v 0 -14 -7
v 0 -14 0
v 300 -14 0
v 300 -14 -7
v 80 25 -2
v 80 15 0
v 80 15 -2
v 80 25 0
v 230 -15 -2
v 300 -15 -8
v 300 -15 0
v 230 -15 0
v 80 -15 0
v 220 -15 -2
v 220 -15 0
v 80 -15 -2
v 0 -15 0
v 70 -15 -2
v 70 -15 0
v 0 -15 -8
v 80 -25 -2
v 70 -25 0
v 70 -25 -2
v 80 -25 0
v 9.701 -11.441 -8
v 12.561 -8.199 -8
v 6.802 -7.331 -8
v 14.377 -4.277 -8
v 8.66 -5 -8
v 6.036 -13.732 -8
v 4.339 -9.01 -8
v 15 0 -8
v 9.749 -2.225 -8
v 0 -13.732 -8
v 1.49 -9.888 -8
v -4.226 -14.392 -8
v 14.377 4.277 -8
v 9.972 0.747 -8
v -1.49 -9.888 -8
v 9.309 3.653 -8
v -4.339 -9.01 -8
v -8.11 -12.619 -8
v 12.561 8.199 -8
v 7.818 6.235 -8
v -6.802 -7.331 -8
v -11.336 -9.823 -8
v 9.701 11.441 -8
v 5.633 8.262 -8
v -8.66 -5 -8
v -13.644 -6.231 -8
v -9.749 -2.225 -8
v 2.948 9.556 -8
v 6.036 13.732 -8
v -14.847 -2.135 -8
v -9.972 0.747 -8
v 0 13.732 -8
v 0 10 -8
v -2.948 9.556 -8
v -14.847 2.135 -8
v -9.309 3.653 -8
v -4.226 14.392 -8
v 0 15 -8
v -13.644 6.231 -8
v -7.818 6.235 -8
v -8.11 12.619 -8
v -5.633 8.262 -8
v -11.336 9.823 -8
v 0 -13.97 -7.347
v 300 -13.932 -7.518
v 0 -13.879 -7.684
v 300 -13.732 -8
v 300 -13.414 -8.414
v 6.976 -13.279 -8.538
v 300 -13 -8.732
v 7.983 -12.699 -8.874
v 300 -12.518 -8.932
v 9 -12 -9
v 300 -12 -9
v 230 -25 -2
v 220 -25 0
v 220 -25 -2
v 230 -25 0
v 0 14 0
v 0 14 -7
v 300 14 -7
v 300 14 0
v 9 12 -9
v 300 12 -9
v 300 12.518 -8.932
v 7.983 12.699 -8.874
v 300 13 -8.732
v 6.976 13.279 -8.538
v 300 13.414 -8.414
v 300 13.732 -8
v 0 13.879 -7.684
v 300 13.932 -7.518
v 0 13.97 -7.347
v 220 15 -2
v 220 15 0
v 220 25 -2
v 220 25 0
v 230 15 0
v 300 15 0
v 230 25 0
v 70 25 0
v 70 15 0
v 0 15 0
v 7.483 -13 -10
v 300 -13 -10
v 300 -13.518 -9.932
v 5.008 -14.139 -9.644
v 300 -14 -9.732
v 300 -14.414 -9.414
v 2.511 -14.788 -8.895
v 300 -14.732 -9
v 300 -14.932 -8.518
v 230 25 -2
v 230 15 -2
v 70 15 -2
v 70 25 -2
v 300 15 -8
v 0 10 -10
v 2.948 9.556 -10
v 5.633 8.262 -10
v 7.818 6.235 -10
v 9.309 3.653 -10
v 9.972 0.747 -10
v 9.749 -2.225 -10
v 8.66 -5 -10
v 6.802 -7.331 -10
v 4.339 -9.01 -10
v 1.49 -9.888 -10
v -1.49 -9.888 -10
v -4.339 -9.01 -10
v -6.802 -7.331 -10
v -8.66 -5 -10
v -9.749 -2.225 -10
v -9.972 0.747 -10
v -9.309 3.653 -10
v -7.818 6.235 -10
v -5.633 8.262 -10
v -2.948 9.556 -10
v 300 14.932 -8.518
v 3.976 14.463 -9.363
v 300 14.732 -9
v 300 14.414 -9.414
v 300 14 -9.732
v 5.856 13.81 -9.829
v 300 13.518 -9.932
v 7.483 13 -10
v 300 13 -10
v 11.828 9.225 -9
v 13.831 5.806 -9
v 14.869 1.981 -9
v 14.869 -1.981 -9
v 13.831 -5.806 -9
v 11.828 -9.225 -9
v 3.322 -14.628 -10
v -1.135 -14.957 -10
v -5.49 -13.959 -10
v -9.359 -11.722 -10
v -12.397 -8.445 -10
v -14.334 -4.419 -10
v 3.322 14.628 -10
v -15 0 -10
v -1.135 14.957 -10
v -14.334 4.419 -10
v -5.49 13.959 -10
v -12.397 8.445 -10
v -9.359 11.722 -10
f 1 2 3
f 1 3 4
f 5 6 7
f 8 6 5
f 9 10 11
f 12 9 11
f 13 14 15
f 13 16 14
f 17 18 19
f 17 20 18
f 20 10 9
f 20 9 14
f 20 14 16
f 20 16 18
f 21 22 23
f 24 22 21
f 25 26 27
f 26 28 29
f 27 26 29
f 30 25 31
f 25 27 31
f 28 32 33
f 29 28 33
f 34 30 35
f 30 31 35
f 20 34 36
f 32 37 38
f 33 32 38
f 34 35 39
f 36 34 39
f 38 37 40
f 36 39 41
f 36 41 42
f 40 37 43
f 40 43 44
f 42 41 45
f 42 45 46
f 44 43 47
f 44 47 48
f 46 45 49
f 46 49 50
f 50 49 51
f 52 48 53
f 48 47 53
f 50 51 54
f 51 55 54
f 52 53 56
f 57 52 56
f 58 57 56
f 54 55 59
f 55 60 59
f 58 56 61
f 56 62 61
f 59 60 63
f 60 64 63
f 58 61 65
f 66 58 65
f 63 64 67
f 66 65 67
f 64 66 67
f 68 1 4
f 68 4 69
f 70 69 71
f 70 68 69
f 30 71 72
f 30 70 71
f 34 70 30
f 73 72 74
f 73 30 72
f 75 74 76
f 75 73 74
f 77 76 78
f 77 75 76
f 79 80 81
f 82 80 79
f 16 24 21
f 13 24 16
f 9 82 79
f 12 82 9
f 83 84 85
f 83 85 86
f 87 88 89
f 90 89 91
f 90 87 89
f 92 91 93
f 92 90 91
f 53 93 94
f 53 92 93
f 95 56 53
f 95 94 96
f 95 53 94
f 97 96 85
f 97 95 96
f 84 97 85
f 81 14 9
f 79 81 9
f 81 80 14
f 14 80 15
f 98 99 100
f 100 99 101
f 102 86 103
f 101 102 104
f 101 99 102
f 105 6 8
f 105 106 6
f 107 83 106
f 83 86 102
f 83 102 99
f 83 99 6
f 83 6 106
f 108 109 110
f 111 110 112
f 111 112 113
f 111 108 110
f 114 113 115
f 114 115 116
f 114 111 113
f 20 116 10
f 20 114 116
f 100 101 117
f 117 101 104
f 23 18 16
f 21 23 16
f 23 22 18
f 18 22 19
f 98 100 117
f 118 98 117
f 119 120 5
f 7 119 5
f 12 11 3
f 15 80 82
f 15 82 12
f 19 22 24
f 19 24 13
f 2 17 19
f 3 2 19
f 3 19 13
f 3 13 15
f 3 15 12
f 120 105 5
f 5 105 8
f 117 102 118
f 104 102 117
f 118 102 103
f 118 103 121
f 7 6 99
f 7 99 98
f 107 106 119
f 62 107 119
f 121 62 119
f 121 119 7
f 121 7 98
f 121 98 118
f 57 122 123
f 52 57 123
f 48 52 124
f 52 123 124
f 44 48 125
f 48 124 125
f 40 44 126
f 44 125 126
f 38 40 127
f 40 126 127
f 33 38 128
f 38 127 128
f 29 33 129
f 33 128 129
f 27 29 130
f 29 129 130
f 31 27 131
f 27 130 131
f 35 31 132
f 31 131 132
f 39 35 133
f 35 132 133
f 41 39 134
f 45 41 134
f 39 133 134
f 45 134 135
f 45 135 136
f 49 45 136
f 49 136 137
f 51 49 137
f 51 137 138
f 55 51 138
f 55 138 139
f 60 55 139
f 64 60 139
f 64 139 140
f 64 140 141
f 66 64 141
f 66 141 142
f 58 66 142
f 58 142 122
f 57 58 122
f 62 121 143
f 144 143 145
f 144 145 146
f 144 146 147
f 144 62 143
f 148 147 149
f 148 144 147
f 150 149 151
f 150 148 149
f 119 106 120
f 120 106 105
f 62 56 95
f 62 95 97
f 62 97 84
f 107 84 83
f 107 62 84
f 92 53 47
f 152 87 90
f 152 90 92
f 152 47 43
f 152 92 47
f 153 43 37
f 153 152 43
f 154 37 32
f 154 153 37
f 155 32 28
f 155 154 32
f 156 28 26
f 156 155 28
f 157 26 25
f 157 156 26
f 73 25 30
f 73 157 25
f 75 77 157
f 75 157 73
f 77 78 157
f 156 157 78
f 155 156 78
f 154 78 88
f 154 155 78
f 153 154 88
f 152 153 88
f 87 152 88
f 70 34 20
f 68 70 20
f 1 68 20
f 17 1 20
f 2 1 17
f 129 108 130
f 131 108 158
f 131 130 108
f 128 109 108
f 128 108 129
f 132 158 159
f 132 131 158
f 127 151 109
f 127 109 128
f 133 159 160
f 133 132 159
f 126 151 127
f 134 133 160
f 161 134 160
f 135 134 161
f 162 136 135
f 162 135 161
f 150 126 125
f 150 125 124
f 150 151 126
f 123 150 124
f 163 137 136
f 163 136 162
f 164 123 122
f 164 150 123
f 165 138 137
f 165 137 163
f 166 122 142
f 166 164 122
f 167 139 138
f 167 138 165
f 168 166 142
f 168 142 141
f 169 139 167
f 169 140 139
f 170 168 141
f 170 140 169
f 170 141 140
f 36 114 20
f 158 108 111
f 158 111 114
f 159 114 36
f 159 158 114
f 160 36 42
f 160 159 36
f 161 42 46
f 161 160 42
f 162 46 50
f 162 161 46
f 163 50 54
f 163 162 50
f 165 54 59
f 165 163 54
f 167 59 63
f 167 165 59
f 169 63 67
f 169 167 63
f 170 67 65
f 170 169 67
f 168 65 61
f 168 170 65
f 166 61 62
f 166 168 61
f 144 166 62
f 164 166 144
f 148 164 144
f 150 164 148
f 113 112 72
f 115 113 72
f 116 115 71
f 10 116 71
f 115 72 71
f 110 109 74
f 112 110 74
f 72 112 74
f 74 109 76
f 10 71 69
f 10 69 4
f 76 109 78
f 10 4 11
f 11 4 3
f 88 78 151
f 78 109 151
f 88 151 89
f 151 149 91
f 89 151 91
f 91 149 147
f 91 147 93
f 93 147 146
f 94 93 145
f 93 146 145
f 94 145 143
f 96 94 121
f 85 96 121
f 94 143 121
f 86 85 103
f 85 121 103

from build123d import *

# Parameters (mm, degrees)
BOSS_EXTRUDE1_DEPTH = 300
SKETCH2_W           = 10
SKETCH2_H           = 10
BOSS_EXTRUDE2_DEPTH = 2
SKETCH4_R           = 15
SKETCH4_R_2         = 10
BOSS_EXTRUDE3_DEPTH = 2
SKETCH4_3_R         = 10
CUT_EXTRUDE1_DEPTH  = 2


with BuildPart() as part:
    # Sketch1 → Boss-Extrude1 (new body)
    with BuildSketch(Plane(origin=(0, 0, 0), x_dir=(0, 0, -1), z_dir=(1, 0, 0))):
        with BuildLine():
            Line((8, 15), (0, 15))
            Line((0, 15), (0, 14))
            Line((0, 14), (7, 14))
            ThreePointArc((7, 14), (8.414213562, 13.414213562), (9, 12))
            Line((9, 12), (9, -12))
            ThreePointArc((9, -12), (8.414213562, -13.414213562), (7, -14))
            Line((7, -14), (0, -14))
            Line((0, -14), (0, -15))
            Line((0, -15), (8, -15))
            ThreePointArc((8, -15), (9.414213562, -14.414213562), (10, -13))
            Line((10, -13), (10, 13))
            ThreePointArc((10, 13), (9.414213562, 14.414213562), (8, 15))
        make_face()
    extrude(amount=BOSS_EXTRUDE1_DEPTH)

    # Sketch2 → Boss-Extrude2 (add)
    with BuildSketch(Plane.XY):
        with Locations((75, 20)):
            Rectangle(SKETCH2_W, SKETCH2_H)
        with Locations((75, -20)):
            Rectangle(SKETCH2_W, SKETCH2_H)
        with Locations((225, 20)):
            Rectangle(SKETCH2_W, SKETCH2_H)
        with Locations((225, -20)):
            Rectangle(SKETCH2_W, SKETCH2_H)
    extrude(amount=-BOSS_EXTRUDE2_DEPTH)

    # Sketch4 → Boss-Extrude3 (add)
    with BuildSketch(Plane(origin=(0, 0, -10), x_dir=(-1, 0, 0), z_dir=(0, 0, -1))):
        Circle(SKETCH4_R)
        Circle(SKETCH4_R_2, mode=Mode.SUBTRACT)
    extrude(amount=-BOSS_EXTRUDE3_DEPTH)

    # Sketch4<3> → Cut-Extrude1 (cut)
    with BuildSketch(Plane(origin=(0, 0, -10), x_dir=(-1, 0, 0), z_dir=(0, 0, -1))):
        Circle(SKETCH4_3_R)
    extrude(amount=-CUT_EXTRUDE1_DEPTH, mode=Mode.SUBTRACT)


solid = part.part
